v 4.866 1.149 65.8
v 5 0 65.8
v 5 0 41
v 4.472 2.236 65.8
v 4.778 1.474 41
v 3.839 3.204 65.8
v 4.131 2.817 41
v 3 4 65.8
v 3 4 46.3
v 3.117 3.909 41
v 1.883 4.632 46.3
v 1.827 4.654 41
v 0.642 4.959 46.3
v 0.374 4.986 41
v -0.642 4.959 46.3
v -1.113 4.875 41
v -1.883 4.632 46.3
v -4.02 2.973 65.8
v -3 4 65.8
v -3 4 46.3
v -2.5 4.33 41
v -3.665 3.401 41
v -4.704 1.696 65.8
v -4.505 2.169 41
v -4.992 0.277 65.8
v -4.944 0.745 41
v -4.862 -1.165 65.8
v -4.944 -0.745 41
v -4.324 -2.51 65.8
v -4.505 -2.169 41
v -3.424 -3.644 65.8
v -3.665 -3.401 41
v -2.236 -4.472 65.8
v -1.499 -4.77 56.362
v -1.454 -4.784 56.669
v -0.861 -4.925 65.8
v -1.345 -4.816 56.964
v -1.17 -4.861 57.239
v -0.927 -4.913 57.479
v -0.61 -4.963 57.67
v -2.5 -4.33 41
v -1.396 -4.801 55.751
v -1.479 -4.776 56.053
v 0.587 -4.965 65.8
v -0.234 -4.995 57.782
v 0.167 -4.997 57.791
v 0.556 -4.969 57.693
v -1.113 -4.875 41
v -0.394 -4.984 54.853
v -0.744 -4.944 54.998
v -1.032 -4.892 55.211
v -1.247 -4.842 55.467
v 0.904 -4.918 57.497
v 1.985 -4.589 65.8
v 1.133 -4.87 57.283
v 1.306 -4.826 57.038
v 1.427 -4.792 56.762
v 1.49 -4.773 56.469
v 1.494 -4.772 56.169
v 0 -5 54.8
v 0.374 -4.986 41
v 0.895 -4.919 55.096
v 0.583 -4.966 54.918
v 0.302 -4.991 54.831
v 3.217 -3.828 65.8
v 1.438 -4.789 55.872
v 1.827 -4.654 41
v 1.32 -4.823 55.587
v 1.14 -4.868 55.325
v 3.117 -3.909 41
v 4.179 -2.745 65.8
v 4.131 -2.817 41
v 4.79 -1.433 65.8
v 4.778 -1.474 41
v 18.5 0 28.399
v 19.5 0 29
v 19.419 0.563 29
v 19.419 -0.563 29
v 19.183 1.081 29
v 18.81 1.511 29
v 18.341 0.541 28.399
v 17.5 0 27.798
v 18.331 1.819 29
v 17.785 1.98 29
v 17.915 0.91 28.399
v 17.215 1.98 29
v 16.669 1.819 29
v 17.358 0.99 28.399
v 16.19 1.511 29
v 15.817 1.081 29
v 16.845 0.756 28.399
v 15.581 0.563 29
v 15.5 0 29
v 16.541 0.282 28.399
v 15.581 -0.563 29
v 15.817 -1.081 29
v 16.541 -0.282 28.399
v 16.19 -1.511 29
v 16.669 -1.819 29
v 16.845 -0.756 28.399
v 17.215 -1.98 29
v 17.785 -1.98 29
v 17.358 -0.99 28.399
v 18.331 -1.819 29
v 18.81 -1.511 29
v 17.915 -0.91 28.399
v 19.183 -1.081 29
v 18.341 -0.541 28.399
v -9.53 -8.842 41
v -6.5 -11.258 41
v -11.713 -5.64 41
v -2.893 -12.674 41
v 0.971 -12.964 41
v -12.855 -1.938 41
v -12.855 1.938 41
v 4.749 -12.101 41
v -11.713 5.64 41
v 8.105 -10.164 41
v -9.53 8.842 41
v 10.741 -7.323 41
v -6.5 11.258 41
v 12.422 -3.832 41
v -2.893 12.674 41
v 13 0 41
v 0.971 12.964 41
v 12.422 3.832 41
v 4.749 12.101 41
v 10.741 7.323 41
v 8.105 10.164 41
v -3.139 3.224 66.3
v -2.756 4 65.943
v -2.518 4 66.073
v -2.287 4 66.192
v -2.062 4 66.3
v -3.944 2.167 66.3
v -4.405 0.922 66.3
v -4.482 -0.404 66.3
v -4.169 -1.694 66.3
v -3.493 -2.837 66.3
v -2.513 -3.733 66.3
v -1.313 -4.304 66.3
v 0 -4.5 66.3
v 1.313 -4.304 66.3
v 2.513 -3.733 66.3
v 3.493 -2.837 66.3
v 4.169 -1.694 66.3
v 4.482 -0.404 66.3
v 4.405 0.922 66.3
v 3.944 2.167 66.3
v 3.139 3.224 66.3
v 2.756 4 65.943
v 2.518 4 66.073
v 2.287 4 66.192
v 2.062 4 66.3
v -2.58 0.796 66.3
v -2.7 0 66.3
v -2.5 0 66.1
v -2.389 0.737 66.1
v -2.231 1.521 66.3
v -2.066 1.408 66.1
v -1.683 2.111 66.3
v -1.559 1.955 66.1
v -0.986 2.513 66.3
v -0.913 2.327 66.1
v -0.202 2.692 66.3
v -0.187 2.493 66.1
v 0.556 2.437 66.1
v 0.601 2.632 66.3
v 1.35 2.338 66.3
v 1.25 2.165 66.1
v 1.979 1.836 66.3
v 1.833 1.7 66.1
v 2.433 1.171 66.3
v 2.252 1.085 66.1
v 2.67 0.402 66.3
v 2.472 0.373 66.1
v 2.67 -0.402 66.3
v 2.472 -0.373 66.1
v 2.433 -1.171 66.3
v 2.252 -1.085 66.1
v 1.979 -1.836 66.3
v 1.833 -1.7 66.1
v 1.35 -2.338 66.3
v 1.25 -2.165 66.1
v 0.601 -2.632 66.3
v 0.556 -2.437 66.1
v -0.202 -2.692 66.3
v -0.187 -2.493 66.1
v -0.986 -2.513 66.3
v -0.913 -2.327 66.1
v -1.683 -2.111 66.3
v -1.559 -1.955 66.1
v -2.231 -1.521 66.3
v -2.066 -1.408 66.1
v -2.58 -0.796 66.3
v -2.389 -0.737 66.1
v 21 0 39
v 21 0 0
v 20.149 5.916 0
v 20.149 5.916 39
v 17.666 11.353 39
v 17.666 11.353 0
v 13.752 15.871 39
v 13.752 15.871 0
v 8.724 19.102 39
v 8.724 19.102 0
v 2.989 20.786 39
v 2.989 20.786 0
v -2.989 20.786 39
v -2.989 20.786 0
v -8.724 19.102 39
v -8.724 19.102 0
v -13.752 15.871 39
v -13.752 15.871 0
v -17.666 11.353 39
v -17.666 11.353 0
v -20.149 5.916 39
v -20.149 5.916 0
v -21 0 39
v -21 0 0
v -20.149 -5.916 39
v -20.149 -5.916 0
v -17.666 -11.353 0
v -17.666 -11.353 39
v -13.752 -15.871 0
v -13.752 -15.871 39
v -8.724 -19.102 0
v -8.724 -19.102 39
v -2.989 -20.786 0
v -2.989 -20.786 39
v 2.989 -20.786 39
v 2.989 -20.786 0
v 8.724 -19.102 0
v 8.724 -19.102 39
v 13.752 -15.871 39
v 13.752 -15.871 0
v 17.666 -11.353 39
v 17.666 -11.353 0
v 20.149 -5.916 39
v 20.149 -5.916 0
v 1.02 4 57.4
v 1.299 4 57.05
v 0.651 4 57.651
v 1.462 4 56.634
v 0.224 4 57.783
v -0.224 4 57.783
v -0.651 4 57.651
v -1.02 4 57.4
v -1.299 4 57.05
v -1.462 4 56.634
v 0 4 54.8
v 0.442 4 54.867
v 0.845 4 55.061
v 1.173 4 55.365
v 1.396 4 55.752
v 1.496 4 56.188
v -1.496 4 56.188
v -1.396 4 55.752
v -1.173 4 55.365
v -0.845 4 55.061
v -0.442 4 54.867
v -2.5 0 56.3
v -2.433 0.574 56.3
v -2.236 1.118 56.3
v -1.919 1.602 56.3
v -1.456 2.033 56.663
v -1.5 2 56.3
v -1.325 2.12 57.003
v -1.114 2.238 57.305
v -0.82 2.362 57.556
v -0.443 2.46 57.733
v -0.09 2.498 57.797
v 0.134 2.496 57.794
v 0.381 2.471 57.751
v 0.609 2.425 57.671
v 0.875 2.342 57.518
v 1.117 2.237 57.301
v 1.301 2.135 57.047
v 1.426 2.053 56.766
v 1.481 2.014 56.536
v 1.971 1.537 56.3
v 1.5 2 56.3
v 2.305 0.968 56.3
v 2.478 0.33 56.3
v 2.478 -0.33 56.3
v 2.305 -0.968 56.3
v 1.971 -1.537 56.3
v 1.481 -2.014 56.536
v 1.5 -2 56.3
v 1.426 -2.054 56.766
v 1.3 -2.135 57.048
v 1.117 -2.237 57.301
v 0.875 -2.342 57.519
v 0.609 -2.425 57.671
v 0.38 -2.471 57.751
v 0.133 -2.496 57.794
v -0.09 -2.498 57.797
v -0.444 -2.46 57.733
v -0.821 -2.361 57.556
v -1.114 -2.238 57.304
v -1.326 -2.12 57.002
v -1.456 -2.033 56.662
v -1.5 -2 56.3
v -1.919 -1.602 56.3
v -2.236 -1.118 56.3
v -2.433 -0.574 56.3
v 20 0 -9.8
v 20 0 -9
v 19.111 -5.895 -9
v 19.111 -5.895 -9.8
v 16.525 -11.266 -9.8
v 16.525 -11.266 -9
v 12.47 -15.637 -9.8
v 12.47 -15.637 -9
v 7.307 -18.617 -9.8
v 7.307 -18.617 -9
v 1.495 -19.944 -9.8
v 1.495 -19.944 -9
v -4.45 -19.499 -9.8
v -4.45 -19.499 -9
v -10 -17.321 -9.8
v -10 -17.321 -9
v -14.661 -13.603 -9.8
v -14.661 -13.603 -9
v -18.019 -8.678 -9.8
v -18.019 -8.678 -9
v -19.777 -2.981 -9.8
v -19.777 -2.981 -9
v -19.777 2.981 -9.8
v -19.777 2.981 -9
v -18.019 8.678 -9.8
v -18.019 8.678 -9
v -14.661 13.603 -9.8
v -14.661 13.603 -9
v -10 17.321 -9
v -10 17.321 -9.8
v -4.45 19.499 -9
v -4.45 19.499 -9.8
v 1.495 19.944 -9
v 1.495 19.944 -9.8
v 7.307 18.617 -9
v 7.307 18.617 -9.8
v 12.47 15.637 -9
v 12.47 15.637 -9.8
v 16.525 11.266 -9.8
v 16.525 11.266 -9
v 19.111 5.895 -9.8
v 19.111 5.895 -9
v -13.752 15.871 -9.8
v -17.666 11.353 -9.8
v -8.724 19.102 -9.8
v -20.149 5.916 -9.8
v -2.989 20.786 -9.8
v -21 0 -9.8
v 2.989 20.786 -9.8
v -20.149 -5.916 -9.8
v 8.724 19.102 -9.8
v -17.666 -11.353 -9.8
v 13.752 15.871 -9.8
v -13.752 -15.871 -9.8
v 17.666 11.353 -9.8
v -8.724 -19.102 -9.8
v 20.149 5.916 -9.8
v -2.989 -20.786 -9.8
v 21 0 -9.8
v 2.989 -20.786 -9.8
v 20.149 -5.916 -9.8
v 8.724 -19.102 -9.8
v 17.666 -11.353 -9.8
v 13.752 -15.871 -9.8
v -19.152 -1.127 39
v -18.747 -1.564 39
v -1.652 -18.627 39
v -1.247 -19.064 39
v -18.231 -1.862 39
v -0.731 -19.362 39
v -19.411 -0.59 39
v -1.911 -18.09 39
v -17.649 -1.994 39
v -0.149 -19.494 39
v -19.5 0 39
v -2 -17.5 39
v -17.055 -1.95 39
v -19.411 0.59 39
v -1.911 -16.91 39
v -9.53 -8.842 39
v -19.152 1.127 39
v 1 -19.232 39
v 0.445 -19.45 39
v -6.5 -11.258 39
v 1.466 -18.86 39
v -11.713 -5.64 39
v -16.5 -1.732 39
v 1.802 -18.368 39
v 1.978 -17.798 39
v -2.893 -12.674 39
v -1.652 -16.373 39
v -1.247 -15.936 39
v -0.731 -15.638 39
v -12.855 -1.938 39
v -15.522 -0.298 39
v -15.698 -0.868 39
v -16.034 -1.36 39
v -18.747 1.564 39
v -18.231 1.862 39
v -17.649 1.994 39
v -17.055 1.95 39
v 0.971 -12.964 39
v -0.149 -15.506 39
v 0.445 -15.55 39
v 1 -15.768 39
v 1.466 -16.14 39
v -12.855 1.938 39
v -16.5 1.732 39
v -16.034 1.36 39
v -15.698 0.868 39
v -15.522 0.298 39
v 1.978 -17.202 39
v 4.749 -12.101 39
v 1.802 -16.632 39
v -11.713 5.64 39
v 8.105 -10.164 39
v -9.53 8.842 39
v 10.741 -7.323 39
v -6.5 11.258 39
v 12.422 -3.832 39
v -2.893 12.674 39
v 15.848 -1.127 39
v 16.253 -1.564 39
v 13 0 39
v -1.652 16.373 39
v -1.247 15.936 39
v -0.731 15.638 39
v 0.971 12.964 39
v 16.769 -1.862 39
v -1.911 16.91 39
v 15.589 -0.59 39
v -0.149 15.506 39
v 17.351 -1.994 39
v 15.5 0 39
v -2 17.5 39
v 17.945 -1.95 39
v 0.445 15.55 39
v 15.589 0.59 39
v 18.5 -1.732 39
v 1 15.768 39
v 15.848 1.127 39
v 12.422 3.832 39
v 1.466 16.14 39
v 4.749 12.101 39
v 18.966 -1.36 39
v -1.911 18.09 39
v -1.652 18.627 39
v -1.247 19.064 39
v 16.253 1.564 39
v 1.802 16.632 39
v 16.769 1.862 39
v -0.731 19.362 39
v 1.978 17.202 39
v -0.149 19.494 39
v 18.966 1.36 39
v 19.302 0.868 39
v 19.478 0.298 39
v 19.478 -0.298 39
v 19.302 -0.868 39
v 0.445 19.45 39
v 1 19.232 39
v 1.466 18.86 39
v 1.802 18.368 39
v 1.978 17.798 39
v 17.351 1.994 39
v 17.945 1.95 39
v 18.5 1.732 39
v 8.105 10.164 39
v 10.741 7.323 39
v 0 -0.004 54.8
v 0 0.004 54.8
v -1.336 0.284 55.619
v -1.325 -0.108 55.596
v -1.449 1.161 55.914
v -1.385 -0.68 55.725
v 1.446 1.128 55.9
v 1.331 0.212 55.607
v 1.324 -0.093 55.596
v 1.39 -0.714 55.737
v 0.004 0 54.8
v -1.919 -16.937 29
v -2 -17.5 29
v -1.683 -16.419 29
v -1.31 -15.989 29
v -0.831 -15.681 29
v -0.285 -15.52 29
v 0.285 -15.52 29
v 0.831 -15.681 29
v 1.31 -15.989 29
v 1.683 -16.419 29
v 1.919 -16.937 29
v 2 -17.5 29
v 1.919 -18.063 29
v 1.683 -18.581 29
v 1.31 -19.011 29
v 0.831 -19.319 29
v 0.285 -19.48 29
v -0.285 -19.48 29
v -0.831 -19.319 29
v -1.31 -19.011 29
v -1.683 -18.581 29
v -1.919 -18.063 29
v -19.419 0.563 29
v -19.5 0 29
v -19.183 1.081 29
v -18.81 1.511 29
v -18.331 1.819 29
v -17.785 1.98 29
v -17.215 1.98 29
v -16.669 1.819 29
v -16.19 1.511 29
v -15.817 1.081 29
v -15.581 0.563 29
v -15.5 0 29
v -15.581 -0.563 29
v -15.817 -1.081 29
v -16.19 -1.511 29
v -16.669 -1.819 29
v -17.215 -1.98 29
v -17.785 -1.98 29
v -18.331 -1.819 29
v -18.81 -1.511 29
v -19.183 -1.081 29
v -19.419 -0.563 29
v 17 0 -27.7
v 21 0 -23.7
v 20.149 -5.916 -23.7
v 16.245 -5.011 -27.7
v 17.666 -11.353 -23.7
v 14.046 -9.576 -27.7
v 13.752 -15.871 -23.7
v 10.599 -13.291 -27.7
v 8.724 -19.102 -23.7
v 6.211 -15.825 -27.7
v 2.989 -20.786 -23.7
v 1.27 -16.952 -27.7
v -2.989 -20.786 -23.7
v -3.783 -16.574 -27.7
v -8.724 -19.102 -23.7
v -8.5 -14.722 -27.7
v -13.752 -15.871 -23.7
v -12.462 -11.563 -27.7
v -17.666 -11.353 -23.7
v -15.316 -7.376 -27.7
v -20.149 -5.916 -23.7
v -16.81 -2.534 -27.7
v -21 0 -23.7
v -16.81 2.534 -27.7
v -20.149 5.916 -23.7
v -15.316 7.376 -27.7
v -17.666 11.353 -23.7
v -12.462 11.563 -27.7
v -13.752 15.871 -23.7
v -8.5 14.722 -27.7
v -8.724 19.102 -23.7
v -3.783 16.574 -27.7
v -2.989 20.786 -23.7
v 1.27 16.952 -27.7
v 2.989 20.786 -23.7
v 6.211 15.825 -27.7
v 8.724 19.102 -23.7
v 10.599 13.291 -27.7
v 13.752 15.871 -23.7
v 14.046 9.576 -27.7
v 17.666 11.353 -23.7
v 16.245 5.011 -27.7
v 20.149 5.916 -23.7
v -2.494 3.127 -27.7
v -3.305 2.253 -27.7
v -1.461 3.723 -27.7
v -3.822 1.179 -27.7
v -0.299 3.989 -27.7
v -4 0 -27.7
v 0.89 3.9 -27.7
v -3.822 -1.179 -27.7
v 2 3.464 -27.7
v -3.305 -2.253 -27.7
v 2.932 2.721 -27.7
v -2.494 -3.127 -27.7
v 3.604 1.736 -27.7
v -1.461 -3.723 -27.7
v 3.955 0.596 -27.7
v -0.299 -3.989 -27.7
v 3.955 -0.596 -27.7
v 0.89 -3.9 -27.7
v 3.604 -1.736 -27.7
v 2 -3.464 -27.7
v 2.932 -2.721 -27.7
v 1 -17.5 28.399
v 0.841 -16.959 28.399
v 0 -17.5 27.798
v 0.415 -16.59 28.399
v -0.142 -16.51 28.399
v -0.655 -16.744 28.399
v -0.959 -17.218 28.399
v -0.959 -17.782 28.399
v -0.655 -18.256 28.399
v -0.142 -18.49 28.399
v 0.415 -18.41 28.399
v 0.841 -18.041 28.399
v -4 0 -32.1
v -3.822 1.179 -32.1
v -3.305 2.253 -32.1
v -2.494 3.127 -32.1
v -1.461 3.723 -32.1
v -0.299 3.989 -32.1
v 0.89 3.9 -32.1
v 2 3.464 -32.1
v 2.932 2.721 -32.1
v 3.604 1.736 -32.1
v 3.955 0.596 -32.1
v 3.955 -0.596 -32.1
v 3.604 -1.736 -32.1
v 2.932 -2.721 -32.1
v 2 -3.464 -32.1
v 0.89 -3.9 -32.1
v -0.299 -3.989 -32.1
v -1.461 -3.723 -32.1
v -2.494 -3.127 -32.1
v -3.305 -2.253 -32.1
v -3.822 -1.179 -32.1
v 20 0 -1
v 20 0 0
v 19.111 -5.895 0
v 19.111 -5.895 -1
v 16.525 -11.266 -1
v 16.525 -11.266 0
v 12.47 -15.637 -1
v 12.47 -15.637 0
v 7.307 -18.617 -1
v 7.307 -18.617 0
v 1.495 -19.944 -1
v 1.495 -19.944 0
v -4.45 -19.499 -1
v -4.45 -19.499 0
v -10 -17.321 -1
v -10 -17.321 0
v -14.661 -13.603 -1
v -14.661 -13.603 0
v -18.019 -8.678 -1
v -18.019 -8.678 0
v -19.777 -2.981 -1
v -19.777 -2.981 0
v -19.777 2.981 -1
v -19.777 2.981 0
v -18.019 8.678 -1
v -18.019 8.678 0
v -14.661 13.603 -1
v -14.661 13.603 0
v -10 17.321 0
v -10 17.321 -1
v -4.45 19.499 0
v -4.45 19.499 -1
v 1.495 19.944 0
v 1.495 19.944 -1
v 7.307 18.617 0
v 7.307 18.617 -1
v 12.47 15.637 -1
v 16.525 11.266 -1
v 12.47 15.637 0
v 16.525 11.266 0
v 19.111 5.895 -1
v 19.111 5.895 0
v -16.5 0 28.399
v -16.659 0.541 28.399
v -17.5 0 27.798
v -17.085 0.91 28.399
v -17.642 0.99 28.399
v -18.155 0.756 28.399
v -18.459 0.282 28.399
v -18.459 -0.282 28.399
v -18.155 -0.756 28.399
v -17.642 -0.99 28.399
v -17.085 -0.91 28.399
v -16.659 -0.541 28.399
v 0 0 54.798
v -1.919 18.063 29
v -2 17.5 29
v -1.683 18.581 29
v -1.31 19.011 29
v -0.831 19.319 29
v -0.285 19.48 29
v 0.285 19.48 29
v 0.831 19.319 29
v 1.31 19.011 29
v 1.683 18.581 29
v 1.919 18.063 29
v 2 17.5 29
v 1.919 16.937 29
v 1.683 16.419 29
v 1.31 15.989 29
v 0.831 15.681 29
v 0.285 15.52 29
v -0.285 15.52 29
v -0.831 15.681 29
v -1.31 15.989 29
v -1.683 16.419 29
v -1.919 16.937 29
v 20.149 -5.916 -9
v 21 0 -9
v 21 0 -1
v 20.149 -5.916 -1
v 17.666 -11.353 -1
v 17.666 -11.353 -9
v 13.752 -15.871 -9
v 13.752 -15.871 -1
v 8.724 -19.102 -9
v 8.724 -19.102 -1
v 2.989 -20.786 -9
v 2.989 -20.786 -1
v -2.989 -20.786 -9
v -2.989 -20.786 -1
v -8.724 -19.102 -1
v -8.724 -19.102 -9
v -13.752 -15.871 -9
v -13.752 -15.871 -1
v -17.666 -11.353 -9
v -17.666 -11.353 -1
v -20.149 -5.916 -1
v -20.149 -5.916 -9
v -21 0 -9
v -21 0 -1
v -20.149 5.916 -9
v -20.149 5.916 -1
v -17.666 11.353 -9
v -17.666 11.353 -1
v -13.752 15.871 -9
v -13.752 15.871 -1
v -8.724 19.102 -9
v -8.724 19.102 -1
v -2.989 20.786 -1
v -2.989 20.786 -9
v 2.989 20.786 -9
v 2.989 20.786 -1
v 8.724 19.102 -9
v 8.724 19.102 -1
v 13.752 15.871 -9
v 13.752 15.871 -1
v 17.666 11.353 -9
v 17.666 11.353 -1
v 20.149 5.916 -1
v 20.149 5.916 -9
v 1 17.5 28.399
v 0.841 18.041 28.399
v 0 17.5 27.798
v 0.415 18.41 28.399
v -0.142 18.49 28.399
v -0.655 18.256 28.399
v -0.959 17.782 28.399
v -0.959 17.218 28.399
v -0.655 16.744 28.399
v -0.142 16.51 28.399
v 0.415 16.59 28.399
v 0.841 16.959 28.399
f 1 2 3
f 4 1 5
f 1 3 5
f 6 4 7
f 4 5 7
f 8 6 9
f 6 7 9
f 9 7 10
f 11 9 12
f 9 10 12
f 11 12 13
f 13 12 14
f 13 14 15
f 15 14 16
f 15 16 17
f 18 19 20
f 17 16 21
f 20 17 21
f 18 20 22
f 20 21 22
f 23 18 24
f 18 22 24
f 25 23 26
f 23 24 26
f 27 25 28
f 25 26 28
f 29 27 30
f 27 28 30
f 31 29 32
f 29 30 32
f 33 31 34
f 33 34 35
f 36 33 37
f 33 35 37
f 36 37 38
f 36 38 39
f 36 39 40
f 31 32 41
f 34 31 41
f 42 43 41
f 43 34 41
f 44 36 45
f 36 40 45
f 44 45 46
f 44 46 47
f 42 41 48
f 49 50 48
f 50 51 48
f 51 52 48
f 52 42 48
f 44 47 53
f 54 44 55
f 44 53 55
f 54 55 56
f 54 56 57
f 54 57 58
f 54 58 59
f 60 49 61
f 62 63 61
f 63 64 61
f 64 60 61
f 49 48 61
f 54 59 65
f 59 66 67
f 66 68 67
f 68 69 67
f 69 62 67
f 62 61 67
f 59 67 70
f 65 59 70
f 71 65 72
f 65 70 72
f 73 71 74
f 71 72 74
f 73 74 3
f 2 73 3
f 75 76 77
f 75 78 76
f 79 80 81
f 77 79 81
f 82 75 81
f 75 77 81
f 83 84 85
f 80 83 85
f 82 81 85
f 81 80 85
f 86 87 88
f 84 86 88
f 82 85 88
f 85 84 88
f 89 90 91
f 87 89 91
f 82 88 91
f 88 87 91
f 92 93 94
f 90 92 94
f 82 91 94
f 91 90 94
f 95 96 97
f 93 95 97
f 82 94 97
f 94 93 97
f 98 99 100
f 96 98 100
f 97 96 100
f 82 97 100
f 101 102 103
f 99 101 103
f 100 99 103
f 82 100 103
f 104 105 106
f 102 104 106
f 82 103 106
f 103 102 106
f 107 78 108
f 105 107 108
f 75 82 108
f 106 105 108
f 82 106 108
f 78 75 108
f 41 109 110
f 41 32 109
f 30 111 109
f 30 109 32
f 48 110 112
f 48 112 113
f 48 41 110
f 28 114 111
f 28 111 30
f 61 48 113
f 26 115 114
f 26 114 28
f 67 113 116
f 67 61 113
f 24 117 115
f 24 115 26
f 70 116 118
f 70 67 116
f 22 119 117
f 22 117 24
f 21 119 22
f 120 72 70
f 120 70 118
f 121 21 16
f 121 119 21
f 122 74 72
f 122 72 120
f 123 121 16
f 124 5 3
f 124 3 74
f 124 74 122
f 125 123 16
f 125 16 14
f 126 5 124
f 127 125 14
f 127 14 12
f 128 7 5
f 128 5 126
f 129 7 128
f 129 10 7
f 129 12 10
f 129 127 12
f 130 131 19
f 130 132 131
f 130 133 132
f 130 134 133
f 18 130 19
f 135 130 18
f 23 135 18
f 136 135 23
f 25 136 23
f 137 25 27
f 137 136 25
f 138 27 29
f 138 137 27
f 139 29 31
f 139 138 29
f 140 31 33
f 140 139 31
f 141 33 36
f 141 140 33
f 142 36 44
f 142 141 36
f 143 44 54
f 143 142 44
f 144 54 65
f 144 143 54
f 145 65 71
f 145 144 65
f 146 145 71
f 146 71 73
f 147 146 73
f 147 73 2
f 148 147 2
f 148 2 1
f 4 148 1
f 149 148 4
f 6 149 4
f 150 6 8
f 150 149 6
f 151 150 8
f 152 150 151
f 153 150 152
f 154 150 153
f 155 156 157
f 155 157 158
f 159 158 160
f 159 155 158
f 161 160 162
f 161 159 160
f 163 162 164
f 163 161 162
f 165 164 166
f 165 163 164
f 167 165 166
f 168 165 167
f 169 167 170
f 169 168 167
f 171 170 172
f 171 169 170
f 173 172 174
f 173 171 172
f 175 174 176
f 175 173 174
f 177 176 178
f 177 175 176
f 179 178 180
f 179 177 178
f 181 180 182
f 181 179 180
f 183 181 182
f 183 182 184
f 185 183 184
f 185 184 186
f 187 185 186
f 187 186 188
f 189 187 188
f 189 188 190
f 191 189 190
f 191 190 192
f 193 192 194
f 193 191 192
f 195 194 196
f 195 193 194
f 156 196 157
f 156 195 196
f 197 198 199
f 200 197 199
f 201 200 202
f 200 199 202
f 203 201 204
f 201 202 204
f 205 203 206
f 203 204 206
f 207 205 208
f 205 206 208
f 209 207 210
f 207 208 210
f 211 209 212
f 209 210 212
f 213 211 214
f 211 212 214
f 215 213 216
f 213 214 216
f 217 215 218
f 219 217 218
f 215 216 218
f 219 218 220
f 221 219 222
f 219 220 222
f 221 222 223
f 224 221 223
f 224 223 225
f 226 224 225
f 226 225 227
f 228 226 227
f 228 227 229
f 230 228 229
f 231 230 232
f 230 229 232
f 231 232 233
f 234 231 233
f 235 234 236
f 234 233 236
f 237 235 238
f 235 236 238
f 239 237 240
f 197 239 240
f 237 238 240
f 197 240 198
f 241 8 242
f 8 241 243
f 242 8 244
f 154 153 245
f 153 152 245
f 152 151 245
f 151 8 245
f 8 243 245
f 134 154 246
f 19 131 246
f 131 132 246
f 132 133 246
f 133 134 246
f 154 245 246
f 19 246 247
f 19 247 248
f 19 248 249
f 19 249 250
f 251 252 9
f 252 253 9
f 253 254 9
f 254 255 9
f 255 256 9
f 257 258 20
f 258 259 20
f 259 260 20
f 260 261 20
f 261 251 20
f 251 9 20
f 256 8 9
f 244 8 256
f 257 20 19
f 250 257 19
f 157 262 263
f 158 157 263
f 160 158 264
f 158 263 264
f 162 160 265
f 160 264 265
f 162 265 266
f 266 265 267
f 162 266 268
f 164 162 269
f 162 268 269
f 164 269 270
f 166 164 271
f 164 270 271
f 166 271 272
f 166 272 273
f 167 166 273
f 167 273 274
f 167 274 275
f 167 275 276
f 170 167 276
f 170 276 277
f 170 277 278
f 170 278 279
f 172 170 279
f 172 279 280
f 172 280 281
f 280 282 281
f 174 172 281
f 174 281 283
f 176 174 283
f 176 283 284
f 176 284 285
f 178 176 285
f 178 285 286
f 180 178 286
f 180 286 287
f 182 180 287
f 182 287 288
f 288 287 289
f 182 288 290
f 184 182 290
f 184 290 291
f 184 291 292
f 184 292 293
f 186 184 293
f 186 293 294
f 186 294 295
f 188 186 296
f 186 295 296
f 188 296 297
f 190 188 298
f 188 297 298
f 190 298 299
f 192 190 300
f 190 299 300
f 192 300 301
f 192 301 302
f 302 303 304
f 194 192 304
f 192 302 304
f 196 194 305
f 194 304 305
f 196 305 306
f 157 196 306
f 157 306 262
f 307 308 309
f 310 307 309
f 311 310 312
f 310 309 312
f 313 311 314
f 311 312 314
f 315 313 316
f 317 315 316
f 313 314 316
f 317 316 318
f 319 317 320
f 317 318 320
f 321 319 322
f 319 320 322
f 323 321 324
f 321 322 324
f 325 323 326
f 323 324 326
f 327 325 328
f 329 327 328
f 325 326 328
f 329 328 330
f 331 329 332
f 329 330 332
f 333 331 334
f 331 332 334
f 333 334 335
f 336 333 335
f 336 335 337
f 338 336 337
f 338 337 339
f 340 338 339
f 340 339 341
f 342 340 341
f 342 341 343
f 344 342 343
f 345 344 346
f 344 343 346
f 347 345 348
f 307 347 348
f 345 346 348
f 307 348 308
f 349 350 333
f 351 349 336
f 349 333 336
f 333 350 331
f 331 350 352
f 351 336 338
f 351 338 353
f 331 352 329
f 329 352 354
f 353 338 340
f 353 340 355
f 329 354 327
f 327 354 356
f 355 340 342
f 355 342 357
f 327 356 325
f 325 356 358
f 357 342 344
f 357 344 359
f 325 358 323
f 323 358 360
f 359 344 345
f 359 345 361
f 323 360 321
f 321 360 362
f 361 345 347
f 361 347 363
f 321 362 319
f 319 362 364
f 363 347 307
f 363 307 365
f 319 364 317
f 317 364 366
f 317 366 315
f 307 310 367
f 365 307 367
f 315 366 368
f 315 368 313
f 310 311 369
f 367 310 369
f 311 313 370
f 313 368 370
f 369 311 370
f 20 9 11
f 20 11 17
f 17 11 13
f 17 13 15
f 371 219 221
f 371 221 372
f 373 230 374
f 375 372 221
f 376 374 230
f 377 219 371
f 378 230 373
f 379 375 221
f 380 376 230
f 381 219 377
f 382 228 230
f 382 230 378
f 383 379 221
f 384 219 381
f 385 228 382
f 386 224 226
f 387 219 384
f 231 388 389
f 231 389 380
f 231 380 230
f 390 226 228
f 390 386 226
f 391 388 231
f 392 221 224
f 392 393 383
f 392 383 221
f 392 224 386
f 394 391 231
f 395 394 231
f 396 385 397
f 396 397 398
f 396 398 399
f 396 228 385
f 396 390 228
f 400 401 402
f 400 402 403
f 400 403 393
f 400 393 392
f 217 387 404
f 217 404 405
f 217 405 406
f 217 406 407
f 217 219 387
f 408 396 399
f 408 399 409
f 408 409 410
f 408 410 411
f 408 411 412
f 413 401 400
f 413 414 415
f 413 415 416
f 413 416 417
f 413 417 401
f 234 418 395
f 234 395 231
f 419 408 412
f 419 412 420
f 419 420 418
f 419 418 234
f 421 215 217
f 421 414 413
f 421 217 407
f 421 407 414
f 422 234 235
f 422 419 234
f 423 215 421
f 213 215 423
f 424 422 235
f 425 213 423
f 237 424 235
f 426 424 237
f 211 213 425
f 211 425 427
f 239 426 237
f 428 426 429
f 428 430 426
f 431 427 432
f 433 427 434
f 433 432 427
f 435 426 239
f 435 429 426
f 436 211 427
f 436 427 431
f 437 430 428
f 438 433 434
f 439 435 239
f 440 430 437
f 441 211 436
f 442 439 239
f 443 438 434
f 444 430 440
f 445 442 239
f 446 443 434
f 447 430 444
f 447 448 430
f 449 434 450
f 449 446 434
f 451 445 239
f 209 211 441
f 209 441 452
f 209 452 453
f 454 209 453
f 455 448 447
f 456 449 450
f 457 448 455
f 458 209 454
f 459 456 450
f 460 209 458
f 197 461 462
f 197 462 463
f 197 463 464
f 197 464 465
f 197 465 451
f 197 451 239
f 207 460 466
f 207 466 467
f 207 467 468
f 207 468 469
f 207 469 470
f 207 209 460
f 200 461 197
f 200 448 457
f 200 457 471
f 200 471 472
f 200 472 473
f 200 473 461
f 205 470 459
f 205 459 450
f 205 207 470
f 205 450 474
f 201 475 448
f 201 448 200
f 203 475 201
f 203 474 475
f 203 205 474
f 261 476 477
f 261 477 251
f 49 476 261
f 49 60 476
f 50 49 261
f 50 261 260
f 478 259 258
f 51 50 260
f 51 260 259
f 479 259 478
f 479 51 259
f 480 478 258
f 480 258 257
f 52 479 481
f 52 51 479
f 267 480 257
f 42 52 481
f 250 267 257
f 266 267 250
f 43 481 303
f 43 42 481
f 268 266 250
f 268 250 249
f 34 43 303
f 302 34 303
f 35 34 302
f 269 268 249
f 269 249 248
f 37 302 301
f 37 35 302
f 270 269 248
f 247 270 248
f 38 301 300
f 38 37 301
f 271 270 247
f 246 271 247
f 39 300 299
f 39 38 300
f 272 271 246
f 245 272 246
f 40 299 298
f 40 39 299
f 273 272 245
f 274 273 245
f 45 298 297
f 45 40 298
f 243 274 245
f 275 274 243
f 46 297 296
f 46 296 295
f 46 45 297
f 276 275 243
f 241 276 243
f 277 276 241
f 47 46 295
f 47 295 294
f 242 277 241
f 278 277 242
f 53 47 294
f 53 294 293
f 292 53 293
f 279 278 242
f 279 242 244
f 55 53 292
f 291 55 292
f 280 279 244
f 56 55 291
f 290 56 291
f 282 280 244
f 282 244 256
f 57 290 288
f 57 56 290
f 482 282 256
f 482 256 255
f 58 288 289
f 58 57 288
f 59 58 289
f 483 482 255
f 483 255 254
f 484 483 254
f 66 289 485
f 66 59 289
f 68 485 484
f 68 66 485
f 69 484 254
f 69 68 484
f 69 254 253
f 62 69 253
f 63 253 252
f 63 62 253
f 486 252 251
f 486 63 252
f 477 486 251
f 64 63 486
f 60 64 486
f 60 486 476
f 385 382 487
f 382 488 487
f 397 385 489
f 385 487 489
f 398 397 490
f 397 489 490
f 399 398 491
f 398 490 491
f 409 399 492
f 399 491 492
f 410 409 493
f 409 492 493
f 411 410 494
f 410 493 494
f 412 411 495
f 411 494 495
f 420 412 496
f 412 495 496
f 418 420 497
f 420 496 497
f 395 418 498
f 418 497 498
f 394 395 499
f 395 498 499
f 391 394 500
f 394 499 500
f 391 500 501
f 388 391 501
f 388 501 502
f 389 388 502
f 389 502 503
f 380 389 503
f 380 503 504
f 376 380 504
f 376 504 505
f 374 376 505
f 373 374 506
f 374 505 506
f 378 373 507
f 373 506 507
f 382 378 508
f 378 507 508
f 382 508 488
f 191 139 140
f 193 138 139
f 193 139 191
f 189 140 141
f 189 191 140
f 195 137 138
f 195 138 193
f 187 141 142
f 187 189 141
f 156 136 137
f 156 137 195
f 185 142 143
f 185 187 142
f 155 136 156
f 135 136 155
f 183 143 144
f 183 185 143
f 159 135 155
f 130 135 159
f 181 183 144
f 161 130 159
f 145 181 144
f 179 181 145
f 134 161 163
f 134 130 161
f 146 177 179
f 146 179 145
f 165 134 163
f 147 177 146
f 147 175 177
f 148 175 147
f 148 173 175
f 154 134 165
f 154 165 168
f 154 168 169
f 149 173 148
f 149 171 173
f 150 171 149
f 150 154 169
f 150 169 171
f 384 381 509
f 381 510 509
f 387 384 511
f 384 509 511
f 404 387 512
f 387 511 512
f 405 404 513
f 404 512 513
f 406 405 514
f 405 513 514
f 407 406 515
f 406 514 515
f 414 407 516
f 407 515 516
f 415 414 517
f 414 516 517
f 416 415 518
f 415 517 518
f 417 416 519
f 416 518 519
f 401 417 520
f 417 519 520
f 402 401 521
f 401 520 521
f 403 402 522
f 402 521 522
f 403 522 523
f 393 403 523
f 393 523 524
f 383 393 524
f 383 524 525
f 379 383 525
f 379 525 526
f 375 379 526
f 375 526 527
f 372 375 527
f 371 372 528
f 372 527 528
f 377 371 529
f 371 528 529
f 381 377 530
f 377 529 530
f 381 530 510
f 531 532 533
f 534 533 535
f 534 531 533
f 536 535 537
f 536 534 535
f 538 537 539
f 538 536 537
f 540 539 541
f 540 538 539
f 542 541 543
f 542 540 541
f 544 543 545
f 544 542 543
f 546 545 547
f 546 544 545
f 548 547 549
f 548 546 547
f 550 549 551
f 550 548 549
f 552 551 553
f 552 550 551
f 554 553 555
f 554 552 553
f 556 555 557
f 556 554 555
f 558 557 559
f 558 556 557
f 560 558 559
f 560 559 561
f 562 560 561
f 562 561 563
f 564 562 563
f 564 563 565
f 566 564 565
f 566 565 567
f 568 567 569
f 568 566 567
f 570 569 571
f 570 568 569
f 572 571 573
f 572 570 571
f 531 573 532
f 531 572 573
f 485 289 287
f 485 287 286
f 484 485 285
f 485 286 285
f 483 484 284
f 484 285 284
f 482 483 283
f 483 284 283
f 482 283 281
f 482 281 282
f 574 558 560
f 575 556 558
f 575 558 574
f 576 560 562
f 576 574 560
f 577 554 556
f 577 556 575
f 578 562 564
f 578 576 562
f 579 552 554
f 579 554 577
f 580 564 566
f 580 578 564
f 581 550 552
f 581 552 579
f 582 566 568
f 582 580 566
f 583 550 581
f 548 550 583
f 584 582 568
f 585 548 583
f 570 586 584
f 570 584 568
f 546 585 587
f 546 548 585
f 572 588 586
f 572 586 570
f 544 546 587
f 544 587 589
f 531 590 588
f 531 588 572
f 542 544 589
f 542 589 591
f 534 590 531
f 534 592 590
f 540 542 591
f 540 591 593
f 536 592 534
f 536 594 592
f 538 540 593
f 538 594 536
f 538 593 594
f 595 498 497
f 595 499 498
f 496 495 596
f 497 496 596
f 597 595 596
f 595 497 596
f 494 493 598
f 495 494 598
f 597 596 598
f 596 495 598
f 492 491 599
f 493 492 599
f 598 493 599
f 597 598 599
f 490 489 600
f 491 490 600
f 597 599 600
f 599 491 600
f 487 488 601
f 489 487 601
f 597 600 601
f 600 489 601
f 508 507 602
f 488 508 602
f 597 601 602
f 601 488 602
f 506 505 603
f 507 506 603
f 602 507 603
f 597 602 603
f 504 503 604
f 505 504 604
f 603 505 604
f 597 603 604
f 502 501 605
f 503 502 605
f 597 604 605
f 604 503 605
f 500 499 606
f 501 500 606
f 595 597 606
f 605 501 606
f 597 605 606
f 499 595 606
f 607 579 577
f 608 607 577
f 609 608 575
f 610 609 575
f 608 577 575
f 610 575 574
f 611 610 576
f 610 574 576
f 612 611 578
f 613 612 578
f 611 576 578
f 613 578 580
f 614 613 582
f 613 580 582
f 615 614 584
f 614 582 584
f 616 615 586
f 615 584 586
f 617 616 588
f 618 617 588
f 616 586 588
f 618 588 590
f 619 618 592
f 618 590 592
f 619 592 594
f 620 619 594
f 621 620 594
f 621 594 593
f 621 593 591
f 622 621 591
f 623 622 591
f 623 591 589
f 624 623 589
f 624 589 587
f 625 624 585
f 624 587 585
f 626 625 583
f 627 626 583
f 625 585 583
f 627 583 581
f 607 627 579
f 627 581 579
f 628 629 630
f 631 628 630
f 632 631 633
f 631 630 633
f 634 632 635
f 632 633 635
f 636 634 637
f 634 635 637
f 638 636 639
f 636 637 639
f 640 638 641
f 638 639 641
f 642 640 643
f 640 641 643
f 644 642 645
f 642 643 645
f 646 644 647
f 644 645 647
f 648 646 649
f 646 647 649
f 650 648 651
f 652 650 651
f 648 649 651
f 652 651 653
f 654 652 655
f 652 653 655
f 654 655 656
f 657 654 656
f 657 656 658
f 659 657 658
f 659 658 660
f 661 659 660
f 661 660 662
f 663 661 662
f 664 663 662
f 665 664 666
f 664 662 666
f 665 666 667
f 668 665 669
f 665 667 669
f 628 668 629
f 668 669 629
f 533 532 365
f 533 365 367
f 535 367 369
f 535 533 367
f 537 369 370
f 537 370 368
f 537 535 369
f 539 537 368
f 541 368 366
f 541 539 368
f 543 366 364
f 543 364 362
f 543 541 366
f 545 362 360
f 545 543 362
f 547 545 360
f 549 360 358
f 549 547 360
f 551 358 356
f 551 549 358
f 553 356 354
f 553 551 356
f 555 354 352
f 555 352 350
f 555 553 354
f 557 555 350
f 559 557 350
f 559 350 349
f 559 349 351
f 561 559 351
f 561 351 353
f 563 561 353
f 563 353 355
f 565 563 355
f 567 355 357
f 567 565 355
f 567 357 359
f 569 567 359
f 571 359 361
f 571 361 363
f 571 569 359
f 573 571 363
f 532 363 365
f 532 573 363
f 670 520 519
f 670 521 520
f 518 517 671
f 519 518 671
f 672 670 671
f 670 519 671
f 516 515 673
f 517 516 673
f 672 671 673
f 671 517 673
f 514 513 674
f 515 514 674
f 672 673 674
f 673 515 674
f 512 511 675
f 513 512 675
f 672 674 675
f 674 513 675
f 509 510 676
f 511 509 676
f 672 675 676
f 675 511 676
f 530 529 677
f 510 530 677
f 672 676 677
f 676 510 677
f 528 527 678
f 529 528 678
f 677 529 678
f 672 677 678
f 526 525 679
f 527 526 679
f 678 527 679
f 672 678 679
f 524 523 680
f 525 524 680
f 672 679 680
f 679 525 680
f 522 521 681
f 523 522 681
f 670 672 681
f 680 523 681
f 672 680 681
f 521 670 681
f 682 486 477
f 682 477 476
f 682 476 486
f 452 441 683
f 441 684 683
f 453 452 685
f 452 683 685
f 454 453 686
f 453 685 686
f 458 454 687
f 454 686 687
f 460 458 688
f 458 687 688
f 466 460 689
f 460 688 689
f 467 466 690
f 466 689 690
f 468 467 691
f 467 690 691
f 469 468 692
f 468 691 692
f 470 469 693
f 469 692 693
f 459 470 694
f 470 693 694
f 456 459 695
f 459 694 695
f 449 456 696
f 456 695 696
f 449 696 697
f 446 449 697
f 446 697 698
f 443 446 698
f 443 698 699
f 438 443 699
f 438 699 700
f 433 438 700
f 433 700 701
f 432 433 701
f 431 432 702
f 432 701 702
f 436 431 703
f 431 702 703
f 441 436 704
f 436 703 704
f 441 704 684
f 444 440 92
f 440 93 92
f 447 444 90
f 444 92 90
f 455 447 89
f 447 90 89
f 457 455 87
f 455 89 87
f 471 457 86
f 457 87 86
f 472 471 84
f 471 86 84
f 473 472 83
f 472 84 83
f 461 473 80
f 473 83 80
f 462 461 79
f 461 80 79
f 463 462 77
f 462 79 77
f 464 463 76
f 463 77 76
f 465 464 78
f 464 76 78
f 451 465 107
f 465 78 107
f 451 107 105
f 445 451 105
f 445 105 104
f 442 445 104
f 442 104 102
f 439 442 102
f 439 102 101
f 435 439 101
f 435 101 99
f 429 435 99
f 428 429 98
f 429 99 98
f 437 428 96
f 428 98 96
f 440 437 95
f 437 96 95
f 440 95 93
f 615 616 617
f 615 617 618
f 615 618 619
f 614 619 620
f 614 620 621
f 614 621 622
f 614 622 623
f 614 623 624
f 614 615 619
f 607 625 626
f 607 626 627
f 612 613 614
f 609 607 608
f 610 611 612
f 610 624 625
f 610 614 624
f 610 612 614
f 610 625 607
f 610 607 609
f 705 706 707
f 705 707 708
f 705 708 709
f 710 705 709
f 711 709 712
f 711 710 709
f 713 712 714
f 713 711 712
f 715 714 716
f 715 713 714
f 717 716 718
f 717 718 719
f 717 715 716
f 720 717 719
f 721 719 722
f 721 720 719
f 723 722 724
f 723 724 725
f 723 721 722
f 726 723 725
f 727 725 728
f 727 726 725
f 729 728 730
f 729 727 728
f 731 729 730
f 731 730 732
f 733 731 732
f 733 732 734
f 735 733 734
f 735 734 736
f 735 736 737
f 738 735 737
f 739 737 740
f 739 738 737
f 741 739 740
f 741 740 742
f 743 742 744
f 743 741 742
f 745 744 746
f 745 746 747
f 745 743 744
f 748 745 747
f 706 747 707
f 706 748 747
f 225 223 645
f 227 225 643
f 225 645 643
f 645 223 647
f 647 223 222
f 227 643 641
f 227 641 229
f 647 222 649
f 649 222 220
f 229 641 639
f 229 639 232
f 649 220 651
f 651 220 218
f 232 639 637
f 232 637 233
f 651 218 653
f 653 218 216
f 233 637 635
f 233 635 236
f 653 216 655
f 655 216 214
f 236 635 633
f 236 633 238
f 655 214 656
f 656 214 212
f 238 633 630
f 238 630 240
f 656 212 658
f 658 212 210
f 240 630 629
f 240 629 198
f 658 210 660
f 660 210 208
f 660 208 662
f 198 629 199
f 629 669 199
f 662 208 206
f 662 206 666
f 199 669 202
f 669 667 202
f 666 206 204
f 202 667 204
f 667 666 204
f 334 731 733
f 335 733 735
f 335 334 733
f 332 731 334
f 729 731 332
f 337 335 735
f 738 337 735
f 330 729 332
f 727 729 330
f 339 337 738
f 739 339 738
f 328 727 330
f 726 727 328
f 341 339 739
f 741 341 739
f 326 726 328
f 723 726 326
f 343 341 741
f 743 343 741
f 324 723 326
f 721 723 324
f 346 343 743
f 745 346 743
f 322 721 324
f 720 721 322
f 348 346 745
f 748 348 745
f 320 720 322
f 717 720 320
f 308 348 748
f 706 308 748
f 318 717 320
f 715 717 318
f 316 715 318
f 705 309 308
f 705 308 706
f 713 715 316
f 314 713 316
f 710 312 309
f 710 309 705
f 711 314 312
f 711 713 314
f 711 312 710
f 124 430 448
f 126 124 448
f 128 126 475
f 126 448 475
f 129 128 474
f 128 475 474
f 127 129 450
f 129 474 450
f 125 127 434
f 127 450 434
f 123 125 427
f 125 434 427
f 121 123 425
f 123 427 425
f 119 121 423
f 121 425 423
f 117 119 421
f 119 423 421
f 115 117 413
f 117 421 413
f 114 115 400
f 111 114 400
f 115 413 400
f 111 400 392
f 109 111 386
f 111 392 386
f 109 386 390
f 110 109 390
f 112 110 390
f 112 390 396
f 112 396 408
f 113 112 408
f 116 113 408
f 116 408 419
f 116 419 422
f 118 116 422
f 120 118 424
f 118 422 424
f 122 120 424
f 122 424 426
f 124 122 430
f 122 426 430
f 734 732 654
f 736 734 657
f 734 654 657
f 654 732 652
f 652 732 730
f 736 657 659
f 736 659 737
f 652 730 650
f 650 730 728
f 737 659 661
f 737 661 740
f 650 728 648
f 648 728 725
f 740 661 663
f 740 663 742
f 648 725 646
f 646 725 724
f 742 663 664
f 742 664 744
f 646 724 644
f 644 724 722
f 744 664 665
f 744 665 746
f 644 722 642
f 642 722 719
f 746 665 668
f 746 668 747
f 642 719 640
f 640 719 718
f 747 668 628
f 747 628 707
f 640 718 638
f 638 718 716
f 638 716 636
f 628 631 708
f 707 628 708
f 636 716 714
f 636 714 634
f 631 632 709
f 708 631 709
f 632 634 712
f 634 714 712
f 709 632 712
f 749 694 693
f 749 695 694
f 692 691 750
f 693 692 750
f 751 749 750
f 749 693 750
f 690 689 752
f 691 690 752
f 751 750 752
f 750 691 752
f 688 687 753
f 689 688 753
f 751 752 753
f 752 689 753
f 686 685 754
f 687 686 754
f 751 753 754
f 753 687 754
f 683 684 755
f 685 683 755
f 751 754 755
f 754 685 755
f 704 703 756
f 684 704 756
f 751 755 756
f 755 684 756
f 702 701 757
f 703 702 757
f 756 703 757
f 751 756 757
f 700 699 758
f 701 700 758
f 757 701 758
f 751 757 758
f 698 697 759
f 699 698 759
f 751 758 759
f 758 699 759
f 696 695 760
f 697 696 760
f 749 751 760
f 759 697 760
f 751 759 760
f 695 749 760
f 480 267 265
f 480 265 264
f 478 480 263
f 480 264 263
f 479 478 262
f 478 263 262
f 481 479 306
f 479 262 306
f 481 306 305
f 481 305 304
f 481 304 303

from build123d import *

# Parameters (mm, degrees)
SKETCH_1_R           = 21
EXTRUDE_1_DEPTH      = 39
SKETCH_2_R           = 13
EXTRUDE_2_DEPTH      = 2
SKETCH_4_R           = 5
EXTRUDE_3_DEPTH      = 25.3
CHAMFER_1_SIZE       = 0.5
SKETCH_8_R           = 1.5
CUT_EXTRUDE_7_DEPTH  = 10.3
MM_2_D               = 5
MM_2_DEPTH           = 10
MM_2_TIP             = 1.502151548
CUT_EXTRUDE_8_DEPTH  = 2
MM_1_D               = 4
MM_1_DEPTH           = 10
MM_1_TIP             = 1.201721238
SKETCH_23_W          = 4
SKETCH_23_H          = 0.5
CUT_EXTRUDE_12_DEPTH = 2
SKETCH_24_R          = 20
EXTRUDE_4_DEPTH      = 1
EXTRUDE_START        = 8
SKETCH_26_R          = 21
EXTRUDE_5_DEPTH      = 8
SKETCH_27_R          = 20
EXTRUDE_6_DEPTH      = 0.8
EXTRUDE_START_2      = 17.9
SKETCH_28_R          = 21
EXTRUDE_7_DEPTH      = 17.9
CHAMFER_2_SIZE       = 4
SKETCH_29_R          = 4
EXTRUDE_8_DEPTH      = 4.4
CUT_EXTRUDE_16_DEPTH = 2
CHAMFER_3_SIZE       = 0.2


with BuildPart() as part:
    # 草图1 → 凸台-拉伸1 (new body)
    with BuildSketch(Plane.XY):
        Circle(SKETCH_1_R)
    extrude(amount=EXTRUDE_1_DEPTH)

    # 草图2 → 凸台-拉伸2 (add)
    with BuildSketch(Plane.XY.offset(39)):
        Circle(SKETCH_2_R)
    extrude(amount=EXTRUDE_2_DEPTH)

    # 草图4 → 凸台-拉伸3 (add)
    with BuildSketch(Plane.XY.offset(41)):
        Circle(SKETCH_4_R)
    extrude(amount=EXTRUDE_3_DEPTH)

    # 倒角1
    chamfer_1_edges = [part.edges().sort_by_distance(p)[0] for p in [
        (-5, 0, 66.3),
    ]]
    chamfer(chamfer_1_edges, length=CHAMFER_1_SIZE)

    # 草图8 → 切除-拉伸7 (cut)
    with BuildSketch(Plane(origin=(0, -5, 0), x_dir=(1, 0, 0), z_dir=(0, 1, 0))):
        with Locations(Location((0, -56.3, 0), (0, 0, 90))):
            Circle(SKETCH_8_R)
    extrude(amount=CUT_EXTRUDE_7_DEPTH, mode=Mode.SUBTRACT)

    # 大小mm 暗销孔2
    with Locations(Plane.XY.offset(66.3)):
        with Locations((0, 0)):
            Hole(MM_2_D / 2, depth=MM_2_DEPTH)
            with Locations((0, 0, -(MM_2_DEPTH + MM_2_TIP / 2))):  # 118° drill point
                Cone(0, MM_2_D / 2, MM_2_TIP, mode=Mode.SUBTRACT)

    # 草图17 → 切除-拉伸8 (cut)
    with BuildSketch(Plane(origin=(0, 4, 0), x_dir=(1, 0, 0), z_dir=(0, 1, 0))):
        Polygon((0, -65.8), (-2, -65.8), (-2, -46.3), (0, -46.3), (2, -46.3), (2, -65.8), align=None)
    extrude(amount=CUT_EXTRUDE_8_DEPTH, mode=Mode.SUBTRACT)

    # 大小mm 暗销孔1
    with Locations(Plane(origin=(0, 17.5, 39), x_dir=(1, 0, 0), z_dir=(0, 0, 1))):
        with Locations((0, 0), (-17.5, -17.5), (17.5, -17.5), (0, -35)):
            Hole(MM_1_D / 2, depth=MM_1_DEPTH)
            with Locations((0, 0, -(MM_1_DEPTH + MM_1_TIP / 2))):  # 118° drill point
                Cone(0, MM_1_D / 2, MM_1_TIP, mode=Mode.SUBTRACT)

    # 草图23 → 切除-拉伸12 (cut)
    with BuildSketch(Plane(origin=(0, 4, 0), x_dir=(1, 0, 0), z_dir=(0, 1, 0))):
        with Locations((0, -66.05)):
            Rectangle(SKETCH_23_W, SKETCH_23_H)
    extrude(amount=CUT_EXTRUDE_12_DEPTH, mode=Mode.SUBTRACT)

    # 草图24 → 凸台-拉伸4 (add)
    with BuildSketch(Plane(origin=(0, 0, 0), x_dir=(-1, 0, 0), z_dir=(0, 0, -1))):
        with Locations(Location((0, 0, 0), (0, 0, 180))):
            Circle(SKETCH_24_R)
    extrude(amount=EXTRUDE_4_DEPTH)

    # 草图26 → 凸台-拉伸5 (add)
    with BuildSketch(Plane(origin=(0, 0, -1), x_dir=(-1, 0, 0), z_dir=(0, 0, -1)).offset(EXTRUDE_START)):
        with Locations(Location((0, 0, 0), (0, 0, 180))):
            Circle(SKETCH_26_R)
    extrude(amount=-EXTRUDE_5_DEPTH)

    # 草图27 → 凸台-拉伸6 (add)
    with BuildSketch(Plane(origin=(0, 0, -9), x_dir=(-1, 0, 0), z_dir=(0, 0, -1))):
        with Locations(Location((0, 0, 0), (0, 0, 180))):
            Circle(SKETCH_27_R)
    extrude(amount=EXTRUDE_6_DEPTH)

    # 草图28 → 凸台-拉伸7 (add)
    with BuildSketch(Plane(origin=(0, 0, -9.8), x_dir=(-1, 0, 0), z_dir=(0, 0, -1)).offset(EXTRUDE_START_2)):
        with Locations(Location((0, 0, 0), (0, 0, 180))):
            Circle(SKETCH_28_R)
    extrude(amount=-EXTRUDE_7_DEPTH)

    # 倒角2
    chamfer_2_edges = [part.edges().sort_by_distance(p)[0] for p in [
        (-21, 0, -27.7),
    ]]
    chamfer(chamfer_2_edges, length=CHAMFER_2_SIZE)

    # 草图29 → 凸台-拉伸8 (add)
    with BuildSketch(Plane(origin=(0, 0, -27.7), x_dir=(-1, 0, 0), z_dir=(0, 0, -1))):
        Circle(SKETCH_29_R)
    extrude(amount=EXTRUDE_8_DEPTH)

    # 草图30 → 切除-拉伸16 (cut)
    with BuildSketch(Plane(origin=(0, 4, 0), x_dir=(1, 0, 0), z_dir=(0, 1, 0))):
        Polygon((0, -46.3), (3, -46.3), (3, -66.3), (-3, -66.3), (-3, -46.3), align=None)
    extrude(amount=CUT_EXTRUDE_16_DEPTH, mode=Mode.SUBTRACT)

    # 倒角3
    chamfer_3_edges = [part.edges().sort_by_distance(p)[0] for p in [
        (2.5, 0, 66.3),
    ]]
    chamfer(chamfer_3_edges, length=CHAMFER_3_SIZE)


solid = part.part
